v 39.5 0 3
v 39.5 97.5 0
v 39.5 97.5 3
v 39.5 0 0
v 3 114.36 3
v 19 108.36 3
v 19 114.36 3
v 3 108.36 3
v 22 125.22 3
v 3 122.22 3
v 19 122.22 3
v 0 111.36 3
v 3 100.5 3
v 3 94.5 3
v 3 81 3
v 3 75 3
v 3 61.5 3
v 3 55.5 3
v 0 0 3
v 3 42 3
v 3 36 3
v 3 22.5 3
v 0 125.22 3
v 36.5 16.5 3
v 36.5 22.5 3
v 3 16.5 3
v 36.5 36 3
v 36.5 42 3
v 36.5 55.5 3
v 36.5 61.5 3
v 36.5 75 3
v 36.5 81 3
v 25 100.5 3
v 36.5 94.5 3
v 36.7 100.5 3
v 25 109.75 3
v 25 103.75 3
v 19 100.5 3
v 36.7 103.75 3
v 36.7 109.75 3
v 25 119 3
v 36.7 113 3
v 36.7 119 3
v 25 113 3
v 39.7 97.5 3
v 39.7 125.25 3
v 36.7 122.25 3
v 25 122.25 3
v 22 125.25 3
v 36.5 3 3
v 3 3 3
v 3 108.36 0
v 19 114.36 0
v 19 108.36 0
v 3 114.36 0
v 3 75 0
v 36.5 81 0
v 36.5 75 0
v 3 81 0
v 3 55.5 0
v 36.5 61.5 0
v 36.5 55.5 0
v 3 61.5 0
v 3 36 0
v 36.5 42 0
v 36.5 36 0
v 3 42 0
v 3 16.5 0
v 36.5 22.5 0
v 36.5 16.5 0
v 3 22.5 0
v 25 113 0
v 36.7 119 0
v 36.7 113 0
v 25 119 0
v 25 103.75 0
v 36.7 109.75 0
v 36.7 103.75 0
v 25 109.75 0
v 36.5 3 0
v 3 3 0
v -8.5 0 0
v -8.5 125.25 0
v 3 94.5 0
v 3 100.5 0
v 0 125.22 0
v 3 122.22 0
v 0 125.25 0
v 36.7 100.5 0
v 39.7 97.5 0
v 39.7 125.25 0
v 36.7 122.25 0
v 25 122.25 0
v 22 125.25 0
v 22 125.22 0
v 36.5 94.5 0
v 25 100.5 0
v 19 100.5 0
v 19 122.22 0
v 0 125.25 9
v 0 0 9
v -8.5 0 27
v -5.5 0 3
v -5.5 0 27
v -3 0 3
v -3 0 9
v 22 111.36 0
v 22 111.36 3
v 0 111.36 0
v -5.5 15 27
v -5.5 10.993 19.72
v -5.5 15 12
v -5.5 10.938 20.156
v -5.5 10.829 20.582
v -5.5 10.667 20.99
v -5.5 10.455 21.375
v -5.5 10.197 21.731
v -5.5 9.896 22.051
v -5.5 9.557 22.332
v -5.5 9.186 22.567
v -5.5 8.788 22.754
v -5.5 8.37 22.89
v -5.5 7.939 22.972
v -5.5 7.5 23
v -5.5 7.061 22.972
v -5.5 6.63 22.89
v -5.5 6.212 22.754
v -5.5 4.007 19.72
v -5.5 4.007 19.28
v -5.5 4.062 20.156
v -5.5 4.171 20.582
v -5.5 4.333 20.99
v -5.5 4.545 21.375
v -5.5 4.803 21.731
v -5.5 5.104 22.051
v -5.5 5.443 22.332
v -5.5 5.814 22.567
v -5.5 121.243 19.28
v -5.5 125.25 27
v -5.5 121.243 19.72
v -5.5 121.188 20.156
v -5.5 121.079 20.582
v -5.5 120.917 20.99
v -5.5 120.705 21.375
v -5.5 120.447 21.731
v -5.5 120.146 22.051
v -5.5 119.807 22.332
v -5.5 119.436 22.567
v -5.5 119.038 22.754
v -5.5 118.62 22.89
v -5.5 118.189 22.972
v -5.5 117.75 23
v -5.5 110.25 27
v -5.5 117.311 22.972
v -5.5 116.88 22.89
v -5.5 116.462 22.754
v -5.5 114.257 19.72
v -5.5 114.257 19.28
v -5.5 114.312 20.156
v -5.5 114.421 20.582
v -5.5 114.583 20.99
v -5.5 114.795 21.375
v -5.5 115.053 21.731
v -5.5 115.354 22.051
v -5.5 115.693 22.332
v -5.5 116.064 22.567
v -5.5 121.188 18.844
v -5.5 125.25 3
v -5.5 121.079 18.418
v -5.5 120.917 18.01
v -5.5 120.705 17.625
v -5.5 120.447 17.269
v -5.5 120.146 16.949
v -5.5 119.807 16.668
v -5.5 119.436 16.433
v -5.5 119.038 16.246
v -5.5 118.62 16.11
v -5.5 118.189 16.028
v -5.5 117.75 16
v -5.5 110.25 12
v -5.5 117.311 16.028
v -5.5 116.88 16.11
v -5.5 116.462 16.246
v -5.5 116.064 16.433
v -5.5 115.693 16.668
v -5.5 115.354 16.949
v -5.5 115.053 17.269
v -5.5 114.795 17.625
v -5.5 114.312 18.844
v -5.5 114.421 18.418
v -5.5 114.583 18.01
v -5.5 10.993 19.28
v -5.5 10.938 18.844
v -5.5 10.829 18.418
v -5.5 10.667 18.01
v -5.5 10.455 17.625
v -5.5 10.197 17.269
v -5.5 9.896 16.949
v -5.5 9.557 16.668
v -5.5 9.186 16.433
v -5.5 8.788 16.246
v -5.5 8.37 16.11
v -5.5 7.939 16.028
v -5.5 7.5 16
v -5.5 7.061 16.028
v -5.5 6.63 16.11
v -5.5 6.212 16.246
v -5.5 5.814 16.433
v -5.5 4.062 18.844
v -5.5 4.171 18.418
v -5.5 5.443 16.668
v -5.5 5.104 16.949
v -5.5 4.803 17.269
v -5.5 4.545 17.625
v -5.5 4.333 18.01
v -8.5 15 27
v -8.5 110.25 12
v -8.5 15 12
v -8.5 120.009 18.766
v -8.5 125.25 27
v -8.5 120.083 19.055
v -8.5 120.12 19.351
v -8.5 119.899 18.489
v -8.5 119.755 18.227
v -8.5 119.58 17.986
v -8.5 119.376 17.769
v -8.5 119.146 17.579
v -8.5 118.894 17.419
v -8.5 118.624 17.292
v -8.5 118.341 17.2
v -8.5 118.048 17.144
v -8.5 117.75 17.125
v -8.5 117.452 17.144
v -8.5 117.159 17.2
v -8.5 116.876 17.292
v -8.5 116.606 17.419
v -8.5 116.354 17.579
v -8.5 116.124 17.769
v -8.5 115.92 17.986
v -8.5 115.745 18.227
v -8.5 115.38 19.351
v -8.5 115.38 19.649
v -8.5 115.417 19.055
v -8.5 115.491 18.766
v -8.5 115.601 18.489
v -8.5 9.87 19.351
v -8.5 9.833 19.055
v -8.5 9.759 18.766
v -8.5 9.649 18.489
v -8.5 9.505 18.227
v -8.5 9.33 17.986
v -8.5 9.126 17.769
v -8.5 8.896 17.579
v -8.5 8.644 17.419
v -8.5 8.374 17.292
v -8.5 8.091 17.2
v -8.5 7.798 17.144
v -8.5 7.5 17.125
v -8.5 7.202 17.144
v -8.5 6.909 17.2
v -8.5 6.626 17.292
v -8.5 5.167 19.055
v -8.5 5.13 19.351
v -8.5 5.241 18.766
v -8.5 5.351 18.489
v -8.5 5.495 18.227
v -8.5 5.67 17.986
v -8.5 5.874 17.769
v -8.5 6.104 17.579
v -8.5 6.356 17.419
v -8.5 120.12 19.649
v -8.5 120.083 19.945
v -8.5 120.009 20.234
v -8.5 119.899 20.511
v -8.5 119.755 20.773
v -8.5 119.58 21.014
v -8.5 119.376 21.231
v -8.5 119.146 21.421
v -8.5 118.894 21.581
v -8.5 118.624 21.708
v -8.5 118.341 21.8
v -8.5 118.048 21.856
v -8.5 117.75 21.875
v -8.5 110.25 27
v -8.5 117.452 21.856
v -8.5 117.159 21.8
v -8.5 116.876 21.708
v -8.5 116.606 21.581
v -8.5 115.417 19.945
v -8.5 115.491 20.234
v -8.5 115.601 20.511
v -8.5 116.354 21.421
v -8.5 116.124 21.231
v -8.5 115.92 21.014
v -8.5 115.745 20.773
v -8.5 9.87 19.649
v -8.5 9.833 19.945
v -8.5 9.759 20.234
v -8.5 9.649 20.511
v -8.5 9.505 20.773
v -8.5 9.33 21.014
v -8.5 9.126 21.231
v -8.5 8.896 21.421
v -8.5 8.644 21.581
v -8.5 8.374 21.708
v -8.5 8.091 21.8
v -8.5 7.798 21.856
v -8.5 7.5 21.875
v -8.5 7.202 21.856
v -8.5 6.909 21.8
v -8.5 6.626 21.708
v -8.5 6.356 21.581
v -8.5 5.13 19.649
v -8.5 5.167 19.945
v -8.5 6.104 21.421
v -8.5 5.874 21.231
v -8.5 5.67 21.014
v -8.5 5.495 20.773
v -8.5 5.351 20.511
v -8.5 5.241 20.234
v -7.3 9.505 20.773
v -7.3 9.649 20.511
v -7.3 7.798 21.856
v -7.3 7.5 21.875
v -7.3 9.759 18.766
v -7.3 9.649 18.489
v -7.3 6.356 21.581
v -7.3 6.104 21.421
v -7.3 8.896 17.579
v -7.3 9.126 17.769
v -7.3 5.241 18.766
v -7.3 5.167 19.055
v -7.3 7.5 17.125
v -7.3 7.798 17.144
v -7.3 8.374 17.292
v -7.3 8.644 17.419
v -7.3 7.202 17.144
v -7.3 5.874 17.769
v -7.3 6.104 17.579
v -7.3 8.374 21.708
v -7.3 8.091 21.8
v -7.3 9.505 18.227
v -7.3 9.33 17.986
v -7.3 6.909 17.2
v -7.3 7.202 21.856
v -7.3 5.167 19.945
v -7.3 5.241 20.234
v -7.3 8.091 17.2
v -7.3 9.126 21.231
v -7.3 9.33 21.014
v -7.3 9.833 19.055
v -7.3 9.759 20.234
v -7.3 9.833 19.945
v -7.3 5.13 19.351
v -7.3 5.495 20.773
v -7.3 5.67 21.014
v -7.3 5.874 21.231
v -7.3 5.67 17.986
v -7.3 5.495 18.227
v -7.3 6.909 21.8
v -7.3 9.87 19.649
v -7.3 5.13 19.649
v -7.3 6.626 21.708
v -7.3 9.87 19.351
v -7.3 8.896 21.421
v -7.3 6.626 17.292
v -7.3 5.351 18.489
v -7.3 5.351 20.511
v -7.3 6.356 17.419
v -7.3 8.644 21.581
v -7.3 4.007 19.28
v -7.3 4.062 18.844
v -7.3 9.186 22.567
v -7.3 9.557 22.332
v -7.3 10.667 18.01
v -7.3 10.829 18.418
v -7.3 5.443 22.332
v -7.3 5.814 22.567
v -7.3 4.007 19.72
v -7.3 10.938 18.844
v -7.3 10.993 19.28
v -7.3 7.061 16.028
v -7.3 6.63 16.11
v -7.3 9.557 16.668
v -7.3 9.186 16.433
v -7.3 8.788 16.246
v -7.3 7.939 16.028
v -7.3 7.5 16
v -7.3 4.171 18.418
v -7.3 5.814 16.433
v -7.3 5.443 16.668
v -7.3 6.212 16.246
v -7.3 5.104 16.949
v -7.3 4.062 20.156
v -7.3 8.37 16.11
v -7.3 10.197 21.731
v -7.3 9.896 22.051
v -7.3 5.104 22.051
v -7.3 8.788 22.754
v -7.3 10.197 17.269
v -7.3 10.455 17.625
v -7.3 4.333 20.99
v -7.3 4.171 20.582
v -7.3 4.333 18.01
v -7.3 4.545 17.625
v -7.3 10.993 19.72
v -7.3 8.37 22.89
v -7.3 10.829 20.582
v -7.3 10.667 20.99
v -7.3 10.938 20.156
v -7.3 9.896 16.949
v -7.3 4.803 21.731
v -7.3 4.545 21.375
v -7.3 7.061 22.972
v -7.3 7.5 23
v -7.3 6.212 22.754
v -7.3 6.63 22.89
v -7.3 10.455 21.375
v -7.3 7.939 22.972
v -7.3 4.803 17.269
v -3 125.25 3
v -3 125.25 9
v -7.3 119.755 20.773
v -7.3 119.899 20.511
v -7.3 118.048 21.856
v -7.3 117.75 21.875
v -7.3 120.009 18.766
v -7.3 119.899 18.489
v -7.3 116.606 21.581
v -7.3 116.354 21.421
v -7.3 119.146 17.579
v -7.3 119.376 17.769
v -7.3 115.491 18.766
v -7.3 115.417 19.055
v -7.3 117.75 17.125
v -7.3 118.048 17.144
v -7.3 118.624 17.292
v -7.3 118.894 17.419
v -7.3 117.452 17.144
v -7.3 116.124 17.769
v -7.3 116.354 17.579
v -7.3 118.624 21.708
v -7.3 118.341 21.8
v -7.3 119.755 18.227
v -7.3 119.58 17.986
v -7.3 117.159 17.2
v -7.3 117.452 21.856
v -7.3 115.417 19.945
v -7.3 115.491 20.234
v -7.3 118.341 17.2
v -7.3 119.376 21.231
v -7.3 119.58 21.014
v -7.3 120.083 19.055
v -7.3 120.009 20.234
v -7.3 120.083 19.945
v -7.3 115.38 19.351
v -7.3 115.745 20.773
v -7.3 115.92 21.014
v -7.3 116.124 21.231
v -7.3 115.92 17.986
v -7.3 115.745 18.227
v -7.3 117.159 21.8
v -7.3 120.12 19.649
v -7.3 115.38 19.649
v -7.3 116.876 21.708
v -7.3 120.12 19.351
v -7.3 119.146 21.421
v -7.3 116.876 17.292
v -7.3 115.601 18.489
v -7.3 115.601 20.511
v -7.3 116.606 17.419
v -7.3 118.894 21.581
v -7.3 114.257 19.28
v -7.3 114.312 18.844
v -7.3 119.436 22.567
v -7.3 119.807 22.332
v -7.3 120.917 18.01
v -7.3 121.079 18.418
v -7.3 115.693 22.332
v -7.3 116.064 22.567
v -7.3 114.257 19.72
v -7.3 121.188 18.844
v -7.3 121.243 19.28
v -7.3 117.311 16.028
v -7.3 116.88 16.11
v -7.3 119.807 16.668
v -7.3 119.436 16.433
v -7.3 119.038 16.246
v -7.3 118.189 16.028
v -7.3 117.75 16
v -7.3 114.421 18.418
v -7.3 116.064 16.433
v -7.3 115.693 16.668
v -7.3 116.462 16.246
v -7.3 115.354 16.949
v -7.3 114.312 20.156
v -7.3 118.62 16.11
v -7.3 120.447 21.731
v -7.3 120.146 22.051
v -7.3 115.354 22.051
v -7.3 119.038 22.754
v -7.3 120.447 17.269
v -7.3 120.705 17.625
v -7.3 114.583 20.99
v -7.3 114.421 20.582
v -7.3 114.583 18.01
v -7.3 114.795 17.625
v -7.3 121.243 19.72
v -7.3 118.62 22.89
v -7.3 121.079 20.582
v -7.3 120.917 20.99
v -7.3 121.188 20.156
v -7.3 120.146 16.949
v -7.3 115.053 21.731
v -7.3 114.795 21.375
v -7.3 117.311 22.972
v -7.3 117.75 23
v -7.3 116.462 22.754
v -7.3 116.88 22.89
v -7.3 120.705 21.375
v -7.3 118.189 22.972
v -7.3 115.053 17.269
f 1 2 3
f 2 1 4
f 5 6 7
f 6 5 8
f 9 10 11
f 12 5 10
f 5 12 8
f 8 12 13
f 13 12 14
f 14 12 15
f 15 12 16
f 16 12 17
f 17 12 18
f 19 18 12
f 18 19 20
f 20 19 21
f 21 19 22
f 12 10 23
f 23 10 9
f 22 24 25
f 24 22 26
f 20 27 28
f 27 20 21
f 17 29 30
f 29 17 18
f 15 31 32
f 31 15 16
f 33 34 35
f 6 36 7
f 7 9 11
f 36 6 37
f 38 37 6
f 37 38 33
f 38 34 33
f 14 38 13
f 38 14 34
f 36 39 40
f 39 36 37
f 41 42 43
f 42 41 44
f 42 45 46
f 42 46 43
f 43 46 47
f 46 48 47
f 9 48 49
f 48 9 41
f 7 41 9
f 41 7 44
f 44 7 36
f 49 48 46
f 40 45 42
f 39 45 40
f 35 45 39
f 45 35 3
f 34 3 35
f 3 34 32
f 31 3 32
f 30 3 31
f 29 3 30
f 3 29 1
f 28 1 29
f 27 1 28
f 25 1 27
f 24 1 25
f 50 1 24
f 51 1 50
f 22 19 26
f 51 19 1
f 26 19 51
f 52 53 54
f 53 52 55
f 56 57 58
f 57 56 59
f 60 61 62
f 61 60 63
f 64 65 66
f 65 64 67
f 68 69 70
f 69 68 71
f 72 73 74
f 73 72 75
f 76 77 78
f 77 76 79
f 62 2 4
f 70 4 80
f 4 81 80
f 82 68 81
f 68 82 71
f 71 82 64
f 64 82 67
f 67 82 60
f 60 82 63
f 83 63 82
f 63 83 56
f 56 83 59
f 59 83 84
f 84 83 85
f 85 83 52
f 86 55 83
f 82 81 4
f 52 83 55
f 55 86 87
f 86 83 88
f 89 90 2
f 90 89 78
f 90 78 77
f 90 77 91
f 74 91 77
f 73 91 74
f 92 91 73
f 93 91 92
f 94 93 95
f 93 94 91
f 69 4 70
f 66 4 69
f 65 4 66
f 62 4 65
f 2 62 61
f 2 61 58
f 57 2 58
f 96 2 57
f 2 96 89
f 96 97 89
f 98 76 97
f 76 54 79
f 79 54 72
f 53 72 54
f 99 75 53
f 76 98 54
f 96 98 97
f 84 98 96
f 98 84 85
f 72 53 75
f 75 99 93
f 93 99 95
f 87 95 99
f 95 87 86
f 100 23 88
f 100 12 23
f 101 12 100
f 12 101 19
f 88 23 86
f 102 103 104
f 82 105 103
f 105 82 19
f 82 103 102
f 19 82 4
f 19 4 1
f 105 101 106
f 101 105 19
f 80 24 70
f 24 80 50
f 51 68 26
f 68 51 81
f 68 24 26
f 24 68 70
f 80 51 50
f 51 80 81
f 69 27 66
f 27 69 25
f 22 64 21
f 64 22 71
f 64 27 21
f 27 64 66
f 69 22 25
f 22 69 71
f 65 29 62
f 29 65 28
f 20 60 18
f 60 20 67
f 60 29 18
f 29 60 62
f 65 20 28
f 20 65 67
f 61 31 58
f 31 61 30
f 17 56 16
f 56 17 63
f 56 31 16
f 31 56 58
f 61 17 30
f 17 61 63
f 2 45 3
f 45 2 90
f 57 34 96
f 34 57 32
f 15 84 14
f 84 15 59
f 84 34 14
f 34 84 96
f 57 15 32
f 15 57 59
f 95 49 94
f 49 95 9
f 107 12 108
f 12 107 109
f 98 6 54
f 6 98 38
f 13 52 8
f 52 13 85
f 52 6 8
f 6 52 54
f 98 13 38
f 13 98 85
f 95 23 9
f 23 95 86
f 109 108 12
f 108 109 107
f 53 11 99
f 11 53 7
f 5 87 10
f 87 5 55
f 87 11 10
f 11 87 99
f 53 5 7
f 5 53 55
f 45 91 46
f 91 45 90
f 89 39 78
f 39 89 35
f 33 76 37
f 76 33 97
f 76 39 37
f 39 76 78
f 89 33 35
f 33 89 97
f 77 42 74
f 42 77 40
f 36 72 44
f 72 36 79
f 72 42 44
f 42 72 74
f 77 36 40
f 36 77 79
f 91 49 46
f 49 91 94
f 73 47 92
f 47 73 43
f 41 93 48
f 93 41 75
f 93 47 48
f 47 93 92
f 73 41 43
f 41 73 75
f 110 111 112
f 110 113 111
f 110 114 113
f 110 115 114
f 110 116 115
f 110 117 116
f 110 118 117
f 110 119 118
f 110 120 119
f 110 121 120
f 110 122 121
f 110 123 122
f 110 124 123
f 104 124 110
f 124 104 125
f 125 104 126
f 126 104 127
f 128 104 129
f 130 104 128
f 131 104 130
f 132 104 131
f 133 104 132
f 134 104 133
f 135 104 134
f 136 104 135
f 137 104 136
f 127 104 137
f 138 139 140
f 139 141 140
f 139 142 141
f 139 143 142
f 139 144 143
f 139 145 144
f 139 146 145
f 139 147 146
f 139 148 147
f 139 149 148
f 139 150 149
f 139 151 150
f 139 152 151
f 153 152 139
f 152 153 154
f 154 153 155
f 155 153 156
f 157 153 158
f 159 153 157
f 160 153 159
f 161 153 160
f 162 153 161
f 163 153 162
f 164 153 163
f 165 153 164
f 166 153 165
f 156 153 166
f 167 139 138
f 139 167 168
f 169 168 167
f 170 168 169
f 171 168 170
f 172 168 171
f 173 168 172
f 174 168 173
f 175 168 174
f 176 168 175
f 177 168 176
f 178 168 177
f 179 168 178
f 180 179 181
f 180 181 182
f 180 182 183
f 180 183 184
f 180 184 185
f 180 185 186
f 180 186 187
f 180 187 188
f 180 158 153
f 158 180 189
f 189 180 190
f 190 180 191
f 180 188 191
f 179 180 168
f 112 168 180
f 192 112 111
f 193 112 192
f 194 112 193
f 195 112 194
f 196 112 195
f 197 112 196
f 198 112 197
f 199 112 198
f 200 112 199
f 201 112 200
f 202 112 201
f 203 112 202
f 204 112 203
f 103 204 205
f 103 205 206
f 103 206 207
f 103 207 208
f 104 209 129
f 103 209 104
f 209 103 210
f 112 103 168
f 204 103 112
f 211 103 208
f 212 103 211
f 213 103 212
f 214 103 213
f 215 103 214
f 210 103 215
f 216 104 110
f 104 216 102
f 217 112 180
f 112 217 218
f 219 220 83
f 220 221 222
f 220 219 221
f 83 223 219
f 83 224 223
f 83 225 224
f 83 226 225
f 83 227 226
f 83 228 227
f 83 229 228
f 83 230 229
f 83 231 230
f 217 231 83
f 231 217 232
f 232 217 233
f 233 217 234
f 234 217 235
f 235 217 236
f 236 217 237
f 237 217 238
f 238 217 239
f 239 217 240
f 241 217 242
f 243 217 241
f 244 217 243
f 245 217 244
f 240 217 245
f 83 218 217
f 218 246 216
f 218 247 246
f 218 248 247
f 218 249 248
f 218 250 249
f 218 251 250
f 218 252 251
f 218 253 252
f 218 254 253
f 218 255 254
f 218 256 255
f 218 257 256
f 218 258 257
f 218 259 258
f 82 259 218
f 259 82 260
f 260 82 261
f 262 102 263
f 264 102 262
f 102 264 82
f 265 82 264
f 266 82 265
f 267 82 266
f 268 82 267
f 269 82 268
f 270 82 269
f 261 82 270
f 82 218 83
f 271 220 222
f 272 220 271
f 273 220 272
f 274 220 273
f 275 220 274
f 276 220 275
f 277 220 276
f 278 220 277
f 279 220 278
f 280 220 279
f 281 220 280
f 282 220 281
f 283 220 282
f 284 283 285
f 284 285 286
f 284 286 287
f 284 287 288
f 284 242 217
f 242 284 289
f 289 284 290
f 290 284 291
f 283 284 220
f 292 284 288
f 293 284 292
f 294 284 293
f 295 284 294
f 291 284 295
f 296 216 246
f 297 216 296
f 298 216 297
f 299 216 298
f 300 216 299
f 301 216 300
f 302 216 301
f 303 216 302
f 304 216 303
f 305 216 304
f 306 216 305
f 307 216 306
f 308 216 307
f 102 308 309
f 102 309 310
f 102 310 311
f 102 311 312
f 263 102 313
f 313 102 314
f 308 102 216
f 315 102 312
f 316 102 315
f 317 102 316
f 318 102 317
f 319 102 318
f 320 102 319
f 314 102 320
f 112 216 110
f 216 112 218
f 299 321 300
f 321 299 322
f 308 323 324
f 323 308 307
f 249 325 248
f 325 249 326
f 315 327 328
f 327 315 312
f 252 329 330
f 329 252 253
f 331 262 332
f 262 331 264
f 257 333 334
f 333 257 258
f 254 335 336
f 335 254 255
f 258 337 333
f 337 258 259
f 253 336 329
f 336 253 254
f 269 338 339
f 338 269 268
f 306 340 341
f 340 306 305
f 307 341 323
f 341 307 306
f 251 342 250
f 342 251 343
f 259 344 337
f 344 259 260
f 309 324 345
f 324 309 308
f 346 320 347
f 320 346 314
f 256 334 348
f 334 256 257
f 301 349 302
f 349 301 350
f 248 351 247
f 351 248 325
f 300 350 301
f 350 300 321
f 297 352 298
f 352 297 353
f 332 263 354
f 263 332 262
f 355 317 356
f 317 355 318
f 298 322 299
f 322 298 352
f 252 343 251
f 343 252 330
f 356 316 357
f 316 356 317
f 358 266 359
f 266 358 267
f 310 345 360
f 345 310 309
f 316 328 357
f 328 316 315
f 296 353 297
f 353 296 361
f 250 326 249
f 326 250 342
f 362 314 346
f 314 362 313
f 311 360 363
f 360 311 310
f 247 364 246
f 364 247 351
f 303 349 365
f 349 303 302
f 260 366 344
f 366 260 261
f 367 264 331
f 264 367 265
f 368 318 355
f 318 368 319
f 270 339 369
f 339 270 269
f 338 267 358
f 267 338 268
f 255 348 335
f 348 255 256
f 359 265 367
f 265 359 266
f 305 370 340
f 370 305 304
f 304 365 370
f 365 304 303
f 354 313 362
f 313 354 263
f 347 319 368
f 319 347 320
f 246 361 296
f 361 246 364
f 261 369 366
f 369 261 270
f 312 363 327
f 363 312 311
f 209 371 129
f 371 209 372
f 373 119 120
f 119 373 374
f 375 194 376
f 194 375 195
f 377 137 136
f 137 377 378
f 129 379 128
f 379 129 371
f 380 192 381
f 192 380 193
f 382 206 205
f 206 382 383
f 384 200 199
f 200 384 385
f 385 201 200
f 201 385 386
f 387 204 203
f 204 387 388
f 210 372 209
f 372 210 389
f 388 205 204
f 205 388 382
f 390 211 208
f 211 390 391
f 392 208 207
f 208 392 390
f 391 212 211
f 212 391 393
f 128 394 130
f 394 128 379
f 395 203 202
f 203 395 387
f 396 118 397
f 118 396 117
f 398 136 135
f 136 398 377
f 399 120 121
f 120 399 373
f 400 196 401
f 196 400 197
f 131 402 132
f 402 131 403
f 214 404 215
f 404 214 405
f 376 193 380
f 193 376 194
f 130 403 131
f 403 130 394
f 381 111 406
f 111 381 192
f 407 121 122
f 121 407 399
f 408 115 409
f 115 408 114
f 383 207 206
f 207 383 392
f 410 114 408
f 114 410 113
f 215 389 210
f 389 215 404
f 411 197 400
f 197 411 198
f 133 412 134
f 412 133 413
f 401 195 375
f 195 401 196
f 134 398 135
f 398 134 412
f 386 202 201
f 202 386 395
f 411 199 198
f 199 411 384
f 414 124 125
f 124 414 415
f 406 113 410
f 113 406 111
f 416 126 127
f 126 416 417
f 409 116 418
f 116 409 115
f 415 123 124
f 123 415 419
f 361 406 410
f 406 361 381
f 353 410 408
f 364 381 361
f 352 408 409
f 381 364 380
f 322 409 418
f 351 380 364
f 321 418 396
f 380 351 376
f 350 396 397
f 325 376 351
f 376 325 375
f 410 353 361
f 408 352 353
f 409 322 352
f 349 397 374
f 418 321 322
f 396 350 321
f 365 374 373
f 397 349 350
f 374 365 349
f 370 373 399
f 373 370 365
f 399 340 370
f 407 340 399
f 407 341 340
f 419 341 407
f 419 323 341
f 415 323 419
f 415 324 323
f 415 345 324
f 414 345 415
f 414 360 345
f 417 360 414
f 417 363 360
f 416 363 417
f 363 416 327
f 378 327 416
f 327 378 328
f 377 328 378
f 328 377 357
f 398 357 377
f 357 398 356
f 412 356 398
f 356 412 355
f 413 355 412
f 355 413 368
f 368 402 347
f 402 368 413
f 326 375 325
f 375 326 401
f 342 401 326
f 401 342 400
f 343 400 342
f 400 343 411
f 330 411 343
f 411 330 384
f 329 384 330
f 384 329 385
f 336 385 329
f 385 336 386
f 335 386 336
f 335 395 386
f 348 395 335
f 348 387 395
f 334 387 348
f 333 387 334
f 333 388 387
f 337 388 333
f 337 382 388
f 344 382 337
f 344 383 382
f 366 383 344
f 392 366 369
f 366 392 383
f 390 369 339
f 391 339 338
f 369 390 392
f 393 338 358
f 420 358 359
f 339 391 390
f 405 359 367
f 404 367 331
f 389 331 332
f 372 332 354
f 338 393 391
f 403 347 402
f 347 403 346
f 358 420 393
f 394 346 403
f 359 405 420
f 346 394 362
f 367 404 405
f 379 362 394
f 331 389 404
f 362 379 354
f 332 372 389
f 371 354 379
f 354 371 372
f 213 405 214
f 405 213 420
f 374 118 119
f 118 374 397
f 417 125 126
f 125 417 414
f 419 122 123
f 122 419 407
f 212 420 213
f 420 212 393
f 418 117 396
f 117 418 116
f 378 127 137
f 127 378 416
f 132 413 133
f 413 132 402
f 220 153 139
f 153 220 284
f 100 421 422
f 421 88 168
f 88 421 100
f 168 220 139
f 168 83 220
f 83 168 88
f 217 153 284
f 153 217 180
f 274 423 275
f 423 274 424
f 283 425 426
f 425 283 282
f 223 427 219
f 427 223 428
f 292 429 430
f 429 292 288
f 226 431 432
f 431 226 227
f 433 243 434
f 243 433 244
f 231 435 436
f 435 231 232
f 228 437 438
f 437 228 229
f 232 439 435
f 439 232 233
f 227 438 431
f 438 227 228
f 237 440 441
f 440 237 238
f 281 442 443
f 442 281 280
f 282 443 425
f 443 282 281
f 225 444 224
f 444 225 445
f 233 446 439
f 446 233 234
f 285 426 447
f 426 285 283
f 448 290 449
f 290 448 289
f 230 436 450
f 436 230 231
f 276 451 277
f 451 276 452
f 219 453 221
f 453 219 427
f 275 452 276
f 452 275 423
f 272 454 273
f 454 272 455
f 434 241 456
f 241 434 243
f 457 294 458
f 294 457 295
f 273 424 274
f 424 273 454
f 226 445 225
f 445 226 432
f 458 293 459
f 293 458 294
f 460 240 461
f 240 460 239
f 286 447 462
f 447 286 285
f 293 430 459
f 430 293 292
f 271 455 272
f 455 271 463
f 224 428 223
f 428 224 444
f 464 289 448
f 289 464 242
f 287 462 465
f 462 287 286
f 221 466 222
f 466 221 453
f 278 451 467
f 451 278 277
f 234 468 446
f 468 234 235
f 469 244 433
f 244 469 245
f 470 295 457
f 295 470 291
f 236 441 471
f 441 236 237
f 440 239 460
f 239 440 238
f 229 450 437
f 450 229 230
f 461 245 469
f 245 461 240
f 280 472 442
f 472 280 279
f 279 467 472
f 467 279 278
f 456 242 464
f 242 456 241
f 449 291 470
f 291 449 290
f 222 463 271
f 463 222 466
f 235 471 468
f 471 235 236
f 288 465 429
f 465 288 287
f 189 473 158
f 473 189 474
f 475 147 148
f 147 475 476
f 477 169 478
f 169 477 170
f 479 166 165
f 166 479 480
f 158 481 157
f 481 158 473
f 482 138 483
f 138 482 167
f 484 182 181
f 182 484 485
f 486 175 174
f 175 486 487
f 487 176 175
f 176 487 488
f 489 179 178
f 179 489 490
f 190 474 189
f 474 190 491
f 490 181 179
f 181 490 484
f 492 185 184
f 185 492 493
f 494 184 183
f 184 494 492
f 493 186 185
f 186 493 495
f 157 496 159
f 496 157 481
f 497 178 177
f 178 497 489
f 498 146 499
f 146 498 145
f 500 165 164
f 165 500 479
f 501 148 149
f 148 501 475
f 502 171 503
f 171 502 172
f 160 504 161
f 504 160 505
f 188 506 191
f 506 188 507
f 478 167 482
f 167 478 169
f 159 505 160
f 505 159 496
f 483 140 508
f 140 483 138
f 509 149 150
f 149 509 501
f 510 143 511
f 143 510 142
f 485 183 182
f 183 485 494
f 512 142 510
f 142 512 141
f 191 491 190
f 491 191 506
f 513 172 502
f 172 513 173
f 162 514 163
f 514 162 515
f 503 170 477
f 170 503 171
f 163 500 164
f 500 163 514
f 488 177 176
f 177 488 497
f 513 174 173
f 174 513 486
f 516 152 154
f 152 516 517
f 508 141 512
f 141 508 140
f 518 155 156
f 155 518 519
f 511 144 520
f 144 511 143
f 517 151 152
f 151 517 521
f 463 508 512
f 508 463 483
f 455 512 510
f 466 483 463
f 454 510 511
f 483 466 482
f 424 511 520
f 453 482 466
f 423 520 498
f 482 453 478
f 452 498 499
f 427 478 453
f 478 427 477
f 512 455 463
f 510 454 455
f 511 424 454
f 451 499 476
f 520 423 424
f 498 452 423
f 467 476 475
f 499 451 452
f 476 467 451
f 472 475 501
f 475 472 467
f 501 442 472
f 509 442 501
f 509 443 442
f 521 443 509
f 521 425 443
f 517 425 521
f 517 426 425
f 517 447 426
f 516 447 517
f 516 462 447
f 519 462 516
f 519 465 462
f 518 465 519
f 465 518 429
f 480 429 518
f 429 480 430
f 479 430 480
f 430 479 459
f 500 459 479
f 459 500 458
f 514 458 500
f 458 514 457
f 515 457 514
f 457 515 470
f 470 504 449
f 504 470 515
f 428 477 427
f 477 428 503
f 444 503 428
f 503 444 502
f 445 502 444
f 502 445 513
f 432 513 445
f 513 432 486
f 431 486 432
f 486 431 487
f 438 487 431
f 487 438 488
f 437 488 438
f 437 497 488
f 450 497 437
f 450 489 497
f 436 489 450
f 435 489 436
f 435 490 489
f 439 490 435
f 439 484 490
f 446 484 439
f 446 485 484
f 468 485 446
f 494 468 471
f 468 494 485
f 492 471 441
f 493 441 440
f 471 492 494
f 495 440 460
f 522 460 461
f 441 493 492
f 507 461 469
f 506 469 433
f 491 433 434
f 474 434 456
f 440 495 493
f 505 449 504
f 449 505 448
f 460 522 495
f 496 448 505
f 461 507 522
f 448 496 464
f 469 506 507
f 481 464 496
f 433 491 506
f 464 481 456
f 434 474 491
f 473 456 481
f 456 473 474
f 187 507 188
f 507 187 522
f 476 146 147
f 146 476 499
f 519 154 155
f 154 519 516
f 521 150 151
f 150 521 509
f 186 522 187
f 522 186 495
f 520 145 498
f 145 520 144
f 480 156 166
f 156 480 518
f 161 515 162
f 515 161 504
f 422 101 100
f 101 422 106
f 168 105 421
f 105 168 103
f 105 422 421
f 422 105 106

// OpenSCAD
$fn = 50;
min_tool_width = 33.5;
min_tool_thickness = 13.5;
num_tools = 5;

tweezer_width = 11.7;
tweezer_thickness = 3.25;

plat_thickness = 3;

knife_width = 16;
knife_thickness = 7.86;

// Pliers, cutters, scissors

for (i=[0:num_tools-1]) {
    translate([0,i*(plat_thickness*2+min_tool_thickness),0])
    difference(){
        cube([min_tool_width+2*plat_thickness, min_tool_thickness+2*plat_thickness, plat_thickness]);
        translate([plat_thickness,plat_thickness,-0.5])cube([min_tool_width, min_tool_thickness, plat_thickness+1]);
    }
}

// Tweezers

tool_tray_width = num_tools*(plat_thickness*2+min_tool_thickness);

for (i=[0:1]) {
    translate([0,i*(knife_thickness + 2*plat_thickness) + tool_tray_width,0])
    difference(){
        cube([knife_width+2*plat_thickness, knife_thickness+2*plat_thickness, plat_thickness]);
        translate([plat_thickness,plat_thickness,-0.5])cube([knife_width, knife_thickness, plat_thickness+1]);
    }
}

// Sharp stuff

translate([2*plat_thickness + knife_width,0,0])
for (i=[0:2]) {
    translate([0,i*(tweezer_thickness + 2*plat_thickness)+tool_tray_width,0])
    difference(){
        cube([tweezer_width+2*plat_thickness, tweezer_thickness+2*plat_thickness, plat_thickness]);
        translate([plat_thickness,plat_thickness,-0.5])cube([tweezer_width, tweezer_thickness, plat_thickness+1]);
    }
}

// Ruler holder

translate([-plat_thickness,0,plat_thickness])
cube([plat_thickness,  3*(tweezer_thickness + 2*plat_thickness)+tool_tray_width, plat_thickness*2]);

translate([-2*plat_thickness - 2.5,0,plat_thickness])
cube([plat_thickness,  3*(tweezer_thickness + 2*plat_thickness)+tool_tray_width, plat_thickness*3]);

translate([-2*plat_thickness -2.5,0,0])
cube([plat_thickness*2 + 2.5,  3*(tweezer_thickness + 2*plat_thickness)+tool_tray_width, plat_thickness]);

// Hanging
for (i=[0:1]) {
    translate([-(2.5 + 2*plat_thickness),i*(3*(tweezer_thickness + 2*plat_thickness)+tool_tray_width - 5*plat_thickness),4*plat_thickness]){
        difference(){
            difference(){
                cube([plat_thickness,  plat_thickness*5, 5*plat_thickness]);
                translate([-2.5*plat_thickness+0.5, 2.5*plat_thickness,2.5*plat_thickness])
                rotate([0,90,0])
                cylinder(h = 3*plat_thickness, r = 4.75/2);
            }
            translate([1.2, 2.5*plat_thickness,2.5*plat_thickness])
            rotate([0,90,0])
            cylinder(h = 3*plat_thickness, r = 7/2);
        }
    }
}
